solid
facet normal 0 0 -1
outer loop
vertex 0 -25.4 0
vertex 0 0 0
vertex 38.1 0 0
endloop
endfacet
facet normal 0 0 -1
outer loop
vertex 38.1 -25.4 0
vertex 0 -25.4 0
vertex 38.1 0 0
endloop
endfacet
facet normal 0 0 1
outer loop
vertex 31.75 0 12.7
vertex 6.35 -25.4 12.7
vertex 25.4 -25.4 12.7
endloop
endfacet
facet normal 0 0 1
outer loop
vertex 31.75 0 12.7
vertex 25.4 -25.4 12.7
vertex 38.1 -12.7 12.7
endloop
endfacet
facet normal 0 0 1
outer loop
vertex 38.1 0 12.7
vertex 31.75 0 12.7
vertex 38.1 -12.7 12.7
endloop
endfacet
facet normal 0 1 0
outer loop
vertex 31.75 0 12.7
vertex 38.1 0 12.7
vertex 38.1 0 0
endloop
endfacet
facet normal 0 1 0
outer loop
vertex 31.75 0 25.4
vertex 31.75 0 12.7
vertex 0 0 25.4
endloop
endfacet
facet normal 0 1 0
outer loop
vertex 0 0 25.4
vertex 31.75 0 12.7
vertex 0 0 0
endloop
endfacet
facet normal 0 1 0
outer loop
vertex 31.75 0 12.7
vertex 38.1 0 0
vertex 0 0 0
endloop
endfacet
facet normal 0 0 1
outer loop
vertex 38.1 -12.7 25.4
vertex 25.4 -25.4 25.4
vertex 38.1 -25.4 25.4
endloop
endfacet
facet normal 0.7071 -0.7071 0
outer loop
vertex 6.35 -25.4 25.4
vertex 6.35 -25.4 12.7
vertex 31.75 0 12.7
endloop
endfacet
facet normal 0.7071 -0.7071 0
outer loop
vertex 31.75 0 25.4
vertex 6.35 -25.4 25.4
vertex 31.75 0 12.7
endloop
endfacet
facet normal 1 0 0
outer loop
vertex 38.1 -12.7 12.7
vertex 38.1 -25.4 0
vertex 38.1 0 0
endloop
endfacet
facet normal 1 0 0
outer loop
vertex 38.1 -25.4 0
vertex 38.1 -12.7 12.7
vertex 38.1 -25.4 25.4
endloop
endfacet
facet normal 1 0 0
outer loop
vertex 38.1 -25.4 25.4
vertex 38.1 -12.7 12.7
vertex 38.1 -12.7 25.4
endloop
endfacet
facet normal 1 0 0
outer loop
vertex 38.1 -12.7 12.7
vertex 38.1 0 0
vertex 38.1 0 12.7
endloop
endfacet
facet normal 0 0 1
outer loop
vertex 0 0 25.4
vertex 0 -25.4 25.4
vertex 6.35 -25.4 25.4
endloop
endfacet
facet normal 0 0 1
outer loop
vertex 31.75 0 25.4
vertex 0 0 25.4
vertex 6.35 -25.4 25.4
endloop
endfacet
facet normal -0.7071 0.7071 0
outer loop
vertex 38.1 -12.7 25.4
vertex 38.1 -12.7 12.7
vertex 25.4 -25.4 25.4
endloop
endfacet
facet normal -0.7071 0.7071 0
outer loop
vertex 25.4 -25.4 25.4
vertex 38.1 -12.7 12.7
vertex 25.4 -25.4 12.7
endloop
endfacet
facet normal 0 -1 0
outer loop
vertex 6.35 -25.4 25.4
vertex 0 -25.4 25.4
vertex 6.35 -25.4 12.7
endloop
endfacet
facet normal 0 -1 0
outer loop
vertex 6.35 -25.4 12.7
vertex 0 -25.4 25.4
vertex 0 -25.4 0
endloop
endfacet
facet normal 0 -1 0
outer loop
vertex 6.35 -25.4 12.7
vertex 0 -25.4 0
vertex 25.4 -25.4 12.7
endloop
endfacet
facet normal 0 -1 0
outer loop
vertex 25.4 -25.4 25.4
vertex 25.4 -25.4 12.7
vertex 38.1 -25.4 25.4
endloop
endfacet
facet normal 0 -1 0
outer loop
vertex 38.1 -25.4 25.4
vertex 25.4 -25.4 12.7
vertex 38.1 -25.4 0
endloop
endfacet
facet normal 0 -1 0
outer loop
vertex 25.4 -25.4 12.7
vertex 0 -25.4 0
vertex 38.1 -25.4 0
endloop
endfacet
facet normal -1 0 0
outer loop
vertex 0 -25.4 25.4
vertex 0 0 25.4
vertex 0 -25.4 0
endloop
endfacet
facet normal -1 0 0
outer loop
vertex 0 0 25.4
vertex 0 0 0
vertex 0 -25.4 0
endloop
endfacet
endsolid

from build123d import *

# Parameters (mm, degrees)
F0_W     = 38.1
F0_H     = 12.7
F1_DEPTH = 25.4
F3_DEPTH = 12.7


with BuildPart() as f1:
    # F0 (on Front) → F1 (new body)
    with BuildSketch(Plane.XZ):
        with Locations((19.05, 6.35)):
            Rectangle(F0_W, F0_H)
    extrude(amount=F1_DEPTH)

    # F2 (on face) → F3 (join)
    with BuildSketch(Plane.XY.offset(12.7)):
        Polygon((6.35, -25.4), (31.75, 0), (0, 0), (0, -25.4), align=None)
        Polygon((38.1, -12.7), (25.4, -25.4), (38.1, -25.4), align=None)
    extrude(amount=F3_DEPTH)


solid = f1.part
